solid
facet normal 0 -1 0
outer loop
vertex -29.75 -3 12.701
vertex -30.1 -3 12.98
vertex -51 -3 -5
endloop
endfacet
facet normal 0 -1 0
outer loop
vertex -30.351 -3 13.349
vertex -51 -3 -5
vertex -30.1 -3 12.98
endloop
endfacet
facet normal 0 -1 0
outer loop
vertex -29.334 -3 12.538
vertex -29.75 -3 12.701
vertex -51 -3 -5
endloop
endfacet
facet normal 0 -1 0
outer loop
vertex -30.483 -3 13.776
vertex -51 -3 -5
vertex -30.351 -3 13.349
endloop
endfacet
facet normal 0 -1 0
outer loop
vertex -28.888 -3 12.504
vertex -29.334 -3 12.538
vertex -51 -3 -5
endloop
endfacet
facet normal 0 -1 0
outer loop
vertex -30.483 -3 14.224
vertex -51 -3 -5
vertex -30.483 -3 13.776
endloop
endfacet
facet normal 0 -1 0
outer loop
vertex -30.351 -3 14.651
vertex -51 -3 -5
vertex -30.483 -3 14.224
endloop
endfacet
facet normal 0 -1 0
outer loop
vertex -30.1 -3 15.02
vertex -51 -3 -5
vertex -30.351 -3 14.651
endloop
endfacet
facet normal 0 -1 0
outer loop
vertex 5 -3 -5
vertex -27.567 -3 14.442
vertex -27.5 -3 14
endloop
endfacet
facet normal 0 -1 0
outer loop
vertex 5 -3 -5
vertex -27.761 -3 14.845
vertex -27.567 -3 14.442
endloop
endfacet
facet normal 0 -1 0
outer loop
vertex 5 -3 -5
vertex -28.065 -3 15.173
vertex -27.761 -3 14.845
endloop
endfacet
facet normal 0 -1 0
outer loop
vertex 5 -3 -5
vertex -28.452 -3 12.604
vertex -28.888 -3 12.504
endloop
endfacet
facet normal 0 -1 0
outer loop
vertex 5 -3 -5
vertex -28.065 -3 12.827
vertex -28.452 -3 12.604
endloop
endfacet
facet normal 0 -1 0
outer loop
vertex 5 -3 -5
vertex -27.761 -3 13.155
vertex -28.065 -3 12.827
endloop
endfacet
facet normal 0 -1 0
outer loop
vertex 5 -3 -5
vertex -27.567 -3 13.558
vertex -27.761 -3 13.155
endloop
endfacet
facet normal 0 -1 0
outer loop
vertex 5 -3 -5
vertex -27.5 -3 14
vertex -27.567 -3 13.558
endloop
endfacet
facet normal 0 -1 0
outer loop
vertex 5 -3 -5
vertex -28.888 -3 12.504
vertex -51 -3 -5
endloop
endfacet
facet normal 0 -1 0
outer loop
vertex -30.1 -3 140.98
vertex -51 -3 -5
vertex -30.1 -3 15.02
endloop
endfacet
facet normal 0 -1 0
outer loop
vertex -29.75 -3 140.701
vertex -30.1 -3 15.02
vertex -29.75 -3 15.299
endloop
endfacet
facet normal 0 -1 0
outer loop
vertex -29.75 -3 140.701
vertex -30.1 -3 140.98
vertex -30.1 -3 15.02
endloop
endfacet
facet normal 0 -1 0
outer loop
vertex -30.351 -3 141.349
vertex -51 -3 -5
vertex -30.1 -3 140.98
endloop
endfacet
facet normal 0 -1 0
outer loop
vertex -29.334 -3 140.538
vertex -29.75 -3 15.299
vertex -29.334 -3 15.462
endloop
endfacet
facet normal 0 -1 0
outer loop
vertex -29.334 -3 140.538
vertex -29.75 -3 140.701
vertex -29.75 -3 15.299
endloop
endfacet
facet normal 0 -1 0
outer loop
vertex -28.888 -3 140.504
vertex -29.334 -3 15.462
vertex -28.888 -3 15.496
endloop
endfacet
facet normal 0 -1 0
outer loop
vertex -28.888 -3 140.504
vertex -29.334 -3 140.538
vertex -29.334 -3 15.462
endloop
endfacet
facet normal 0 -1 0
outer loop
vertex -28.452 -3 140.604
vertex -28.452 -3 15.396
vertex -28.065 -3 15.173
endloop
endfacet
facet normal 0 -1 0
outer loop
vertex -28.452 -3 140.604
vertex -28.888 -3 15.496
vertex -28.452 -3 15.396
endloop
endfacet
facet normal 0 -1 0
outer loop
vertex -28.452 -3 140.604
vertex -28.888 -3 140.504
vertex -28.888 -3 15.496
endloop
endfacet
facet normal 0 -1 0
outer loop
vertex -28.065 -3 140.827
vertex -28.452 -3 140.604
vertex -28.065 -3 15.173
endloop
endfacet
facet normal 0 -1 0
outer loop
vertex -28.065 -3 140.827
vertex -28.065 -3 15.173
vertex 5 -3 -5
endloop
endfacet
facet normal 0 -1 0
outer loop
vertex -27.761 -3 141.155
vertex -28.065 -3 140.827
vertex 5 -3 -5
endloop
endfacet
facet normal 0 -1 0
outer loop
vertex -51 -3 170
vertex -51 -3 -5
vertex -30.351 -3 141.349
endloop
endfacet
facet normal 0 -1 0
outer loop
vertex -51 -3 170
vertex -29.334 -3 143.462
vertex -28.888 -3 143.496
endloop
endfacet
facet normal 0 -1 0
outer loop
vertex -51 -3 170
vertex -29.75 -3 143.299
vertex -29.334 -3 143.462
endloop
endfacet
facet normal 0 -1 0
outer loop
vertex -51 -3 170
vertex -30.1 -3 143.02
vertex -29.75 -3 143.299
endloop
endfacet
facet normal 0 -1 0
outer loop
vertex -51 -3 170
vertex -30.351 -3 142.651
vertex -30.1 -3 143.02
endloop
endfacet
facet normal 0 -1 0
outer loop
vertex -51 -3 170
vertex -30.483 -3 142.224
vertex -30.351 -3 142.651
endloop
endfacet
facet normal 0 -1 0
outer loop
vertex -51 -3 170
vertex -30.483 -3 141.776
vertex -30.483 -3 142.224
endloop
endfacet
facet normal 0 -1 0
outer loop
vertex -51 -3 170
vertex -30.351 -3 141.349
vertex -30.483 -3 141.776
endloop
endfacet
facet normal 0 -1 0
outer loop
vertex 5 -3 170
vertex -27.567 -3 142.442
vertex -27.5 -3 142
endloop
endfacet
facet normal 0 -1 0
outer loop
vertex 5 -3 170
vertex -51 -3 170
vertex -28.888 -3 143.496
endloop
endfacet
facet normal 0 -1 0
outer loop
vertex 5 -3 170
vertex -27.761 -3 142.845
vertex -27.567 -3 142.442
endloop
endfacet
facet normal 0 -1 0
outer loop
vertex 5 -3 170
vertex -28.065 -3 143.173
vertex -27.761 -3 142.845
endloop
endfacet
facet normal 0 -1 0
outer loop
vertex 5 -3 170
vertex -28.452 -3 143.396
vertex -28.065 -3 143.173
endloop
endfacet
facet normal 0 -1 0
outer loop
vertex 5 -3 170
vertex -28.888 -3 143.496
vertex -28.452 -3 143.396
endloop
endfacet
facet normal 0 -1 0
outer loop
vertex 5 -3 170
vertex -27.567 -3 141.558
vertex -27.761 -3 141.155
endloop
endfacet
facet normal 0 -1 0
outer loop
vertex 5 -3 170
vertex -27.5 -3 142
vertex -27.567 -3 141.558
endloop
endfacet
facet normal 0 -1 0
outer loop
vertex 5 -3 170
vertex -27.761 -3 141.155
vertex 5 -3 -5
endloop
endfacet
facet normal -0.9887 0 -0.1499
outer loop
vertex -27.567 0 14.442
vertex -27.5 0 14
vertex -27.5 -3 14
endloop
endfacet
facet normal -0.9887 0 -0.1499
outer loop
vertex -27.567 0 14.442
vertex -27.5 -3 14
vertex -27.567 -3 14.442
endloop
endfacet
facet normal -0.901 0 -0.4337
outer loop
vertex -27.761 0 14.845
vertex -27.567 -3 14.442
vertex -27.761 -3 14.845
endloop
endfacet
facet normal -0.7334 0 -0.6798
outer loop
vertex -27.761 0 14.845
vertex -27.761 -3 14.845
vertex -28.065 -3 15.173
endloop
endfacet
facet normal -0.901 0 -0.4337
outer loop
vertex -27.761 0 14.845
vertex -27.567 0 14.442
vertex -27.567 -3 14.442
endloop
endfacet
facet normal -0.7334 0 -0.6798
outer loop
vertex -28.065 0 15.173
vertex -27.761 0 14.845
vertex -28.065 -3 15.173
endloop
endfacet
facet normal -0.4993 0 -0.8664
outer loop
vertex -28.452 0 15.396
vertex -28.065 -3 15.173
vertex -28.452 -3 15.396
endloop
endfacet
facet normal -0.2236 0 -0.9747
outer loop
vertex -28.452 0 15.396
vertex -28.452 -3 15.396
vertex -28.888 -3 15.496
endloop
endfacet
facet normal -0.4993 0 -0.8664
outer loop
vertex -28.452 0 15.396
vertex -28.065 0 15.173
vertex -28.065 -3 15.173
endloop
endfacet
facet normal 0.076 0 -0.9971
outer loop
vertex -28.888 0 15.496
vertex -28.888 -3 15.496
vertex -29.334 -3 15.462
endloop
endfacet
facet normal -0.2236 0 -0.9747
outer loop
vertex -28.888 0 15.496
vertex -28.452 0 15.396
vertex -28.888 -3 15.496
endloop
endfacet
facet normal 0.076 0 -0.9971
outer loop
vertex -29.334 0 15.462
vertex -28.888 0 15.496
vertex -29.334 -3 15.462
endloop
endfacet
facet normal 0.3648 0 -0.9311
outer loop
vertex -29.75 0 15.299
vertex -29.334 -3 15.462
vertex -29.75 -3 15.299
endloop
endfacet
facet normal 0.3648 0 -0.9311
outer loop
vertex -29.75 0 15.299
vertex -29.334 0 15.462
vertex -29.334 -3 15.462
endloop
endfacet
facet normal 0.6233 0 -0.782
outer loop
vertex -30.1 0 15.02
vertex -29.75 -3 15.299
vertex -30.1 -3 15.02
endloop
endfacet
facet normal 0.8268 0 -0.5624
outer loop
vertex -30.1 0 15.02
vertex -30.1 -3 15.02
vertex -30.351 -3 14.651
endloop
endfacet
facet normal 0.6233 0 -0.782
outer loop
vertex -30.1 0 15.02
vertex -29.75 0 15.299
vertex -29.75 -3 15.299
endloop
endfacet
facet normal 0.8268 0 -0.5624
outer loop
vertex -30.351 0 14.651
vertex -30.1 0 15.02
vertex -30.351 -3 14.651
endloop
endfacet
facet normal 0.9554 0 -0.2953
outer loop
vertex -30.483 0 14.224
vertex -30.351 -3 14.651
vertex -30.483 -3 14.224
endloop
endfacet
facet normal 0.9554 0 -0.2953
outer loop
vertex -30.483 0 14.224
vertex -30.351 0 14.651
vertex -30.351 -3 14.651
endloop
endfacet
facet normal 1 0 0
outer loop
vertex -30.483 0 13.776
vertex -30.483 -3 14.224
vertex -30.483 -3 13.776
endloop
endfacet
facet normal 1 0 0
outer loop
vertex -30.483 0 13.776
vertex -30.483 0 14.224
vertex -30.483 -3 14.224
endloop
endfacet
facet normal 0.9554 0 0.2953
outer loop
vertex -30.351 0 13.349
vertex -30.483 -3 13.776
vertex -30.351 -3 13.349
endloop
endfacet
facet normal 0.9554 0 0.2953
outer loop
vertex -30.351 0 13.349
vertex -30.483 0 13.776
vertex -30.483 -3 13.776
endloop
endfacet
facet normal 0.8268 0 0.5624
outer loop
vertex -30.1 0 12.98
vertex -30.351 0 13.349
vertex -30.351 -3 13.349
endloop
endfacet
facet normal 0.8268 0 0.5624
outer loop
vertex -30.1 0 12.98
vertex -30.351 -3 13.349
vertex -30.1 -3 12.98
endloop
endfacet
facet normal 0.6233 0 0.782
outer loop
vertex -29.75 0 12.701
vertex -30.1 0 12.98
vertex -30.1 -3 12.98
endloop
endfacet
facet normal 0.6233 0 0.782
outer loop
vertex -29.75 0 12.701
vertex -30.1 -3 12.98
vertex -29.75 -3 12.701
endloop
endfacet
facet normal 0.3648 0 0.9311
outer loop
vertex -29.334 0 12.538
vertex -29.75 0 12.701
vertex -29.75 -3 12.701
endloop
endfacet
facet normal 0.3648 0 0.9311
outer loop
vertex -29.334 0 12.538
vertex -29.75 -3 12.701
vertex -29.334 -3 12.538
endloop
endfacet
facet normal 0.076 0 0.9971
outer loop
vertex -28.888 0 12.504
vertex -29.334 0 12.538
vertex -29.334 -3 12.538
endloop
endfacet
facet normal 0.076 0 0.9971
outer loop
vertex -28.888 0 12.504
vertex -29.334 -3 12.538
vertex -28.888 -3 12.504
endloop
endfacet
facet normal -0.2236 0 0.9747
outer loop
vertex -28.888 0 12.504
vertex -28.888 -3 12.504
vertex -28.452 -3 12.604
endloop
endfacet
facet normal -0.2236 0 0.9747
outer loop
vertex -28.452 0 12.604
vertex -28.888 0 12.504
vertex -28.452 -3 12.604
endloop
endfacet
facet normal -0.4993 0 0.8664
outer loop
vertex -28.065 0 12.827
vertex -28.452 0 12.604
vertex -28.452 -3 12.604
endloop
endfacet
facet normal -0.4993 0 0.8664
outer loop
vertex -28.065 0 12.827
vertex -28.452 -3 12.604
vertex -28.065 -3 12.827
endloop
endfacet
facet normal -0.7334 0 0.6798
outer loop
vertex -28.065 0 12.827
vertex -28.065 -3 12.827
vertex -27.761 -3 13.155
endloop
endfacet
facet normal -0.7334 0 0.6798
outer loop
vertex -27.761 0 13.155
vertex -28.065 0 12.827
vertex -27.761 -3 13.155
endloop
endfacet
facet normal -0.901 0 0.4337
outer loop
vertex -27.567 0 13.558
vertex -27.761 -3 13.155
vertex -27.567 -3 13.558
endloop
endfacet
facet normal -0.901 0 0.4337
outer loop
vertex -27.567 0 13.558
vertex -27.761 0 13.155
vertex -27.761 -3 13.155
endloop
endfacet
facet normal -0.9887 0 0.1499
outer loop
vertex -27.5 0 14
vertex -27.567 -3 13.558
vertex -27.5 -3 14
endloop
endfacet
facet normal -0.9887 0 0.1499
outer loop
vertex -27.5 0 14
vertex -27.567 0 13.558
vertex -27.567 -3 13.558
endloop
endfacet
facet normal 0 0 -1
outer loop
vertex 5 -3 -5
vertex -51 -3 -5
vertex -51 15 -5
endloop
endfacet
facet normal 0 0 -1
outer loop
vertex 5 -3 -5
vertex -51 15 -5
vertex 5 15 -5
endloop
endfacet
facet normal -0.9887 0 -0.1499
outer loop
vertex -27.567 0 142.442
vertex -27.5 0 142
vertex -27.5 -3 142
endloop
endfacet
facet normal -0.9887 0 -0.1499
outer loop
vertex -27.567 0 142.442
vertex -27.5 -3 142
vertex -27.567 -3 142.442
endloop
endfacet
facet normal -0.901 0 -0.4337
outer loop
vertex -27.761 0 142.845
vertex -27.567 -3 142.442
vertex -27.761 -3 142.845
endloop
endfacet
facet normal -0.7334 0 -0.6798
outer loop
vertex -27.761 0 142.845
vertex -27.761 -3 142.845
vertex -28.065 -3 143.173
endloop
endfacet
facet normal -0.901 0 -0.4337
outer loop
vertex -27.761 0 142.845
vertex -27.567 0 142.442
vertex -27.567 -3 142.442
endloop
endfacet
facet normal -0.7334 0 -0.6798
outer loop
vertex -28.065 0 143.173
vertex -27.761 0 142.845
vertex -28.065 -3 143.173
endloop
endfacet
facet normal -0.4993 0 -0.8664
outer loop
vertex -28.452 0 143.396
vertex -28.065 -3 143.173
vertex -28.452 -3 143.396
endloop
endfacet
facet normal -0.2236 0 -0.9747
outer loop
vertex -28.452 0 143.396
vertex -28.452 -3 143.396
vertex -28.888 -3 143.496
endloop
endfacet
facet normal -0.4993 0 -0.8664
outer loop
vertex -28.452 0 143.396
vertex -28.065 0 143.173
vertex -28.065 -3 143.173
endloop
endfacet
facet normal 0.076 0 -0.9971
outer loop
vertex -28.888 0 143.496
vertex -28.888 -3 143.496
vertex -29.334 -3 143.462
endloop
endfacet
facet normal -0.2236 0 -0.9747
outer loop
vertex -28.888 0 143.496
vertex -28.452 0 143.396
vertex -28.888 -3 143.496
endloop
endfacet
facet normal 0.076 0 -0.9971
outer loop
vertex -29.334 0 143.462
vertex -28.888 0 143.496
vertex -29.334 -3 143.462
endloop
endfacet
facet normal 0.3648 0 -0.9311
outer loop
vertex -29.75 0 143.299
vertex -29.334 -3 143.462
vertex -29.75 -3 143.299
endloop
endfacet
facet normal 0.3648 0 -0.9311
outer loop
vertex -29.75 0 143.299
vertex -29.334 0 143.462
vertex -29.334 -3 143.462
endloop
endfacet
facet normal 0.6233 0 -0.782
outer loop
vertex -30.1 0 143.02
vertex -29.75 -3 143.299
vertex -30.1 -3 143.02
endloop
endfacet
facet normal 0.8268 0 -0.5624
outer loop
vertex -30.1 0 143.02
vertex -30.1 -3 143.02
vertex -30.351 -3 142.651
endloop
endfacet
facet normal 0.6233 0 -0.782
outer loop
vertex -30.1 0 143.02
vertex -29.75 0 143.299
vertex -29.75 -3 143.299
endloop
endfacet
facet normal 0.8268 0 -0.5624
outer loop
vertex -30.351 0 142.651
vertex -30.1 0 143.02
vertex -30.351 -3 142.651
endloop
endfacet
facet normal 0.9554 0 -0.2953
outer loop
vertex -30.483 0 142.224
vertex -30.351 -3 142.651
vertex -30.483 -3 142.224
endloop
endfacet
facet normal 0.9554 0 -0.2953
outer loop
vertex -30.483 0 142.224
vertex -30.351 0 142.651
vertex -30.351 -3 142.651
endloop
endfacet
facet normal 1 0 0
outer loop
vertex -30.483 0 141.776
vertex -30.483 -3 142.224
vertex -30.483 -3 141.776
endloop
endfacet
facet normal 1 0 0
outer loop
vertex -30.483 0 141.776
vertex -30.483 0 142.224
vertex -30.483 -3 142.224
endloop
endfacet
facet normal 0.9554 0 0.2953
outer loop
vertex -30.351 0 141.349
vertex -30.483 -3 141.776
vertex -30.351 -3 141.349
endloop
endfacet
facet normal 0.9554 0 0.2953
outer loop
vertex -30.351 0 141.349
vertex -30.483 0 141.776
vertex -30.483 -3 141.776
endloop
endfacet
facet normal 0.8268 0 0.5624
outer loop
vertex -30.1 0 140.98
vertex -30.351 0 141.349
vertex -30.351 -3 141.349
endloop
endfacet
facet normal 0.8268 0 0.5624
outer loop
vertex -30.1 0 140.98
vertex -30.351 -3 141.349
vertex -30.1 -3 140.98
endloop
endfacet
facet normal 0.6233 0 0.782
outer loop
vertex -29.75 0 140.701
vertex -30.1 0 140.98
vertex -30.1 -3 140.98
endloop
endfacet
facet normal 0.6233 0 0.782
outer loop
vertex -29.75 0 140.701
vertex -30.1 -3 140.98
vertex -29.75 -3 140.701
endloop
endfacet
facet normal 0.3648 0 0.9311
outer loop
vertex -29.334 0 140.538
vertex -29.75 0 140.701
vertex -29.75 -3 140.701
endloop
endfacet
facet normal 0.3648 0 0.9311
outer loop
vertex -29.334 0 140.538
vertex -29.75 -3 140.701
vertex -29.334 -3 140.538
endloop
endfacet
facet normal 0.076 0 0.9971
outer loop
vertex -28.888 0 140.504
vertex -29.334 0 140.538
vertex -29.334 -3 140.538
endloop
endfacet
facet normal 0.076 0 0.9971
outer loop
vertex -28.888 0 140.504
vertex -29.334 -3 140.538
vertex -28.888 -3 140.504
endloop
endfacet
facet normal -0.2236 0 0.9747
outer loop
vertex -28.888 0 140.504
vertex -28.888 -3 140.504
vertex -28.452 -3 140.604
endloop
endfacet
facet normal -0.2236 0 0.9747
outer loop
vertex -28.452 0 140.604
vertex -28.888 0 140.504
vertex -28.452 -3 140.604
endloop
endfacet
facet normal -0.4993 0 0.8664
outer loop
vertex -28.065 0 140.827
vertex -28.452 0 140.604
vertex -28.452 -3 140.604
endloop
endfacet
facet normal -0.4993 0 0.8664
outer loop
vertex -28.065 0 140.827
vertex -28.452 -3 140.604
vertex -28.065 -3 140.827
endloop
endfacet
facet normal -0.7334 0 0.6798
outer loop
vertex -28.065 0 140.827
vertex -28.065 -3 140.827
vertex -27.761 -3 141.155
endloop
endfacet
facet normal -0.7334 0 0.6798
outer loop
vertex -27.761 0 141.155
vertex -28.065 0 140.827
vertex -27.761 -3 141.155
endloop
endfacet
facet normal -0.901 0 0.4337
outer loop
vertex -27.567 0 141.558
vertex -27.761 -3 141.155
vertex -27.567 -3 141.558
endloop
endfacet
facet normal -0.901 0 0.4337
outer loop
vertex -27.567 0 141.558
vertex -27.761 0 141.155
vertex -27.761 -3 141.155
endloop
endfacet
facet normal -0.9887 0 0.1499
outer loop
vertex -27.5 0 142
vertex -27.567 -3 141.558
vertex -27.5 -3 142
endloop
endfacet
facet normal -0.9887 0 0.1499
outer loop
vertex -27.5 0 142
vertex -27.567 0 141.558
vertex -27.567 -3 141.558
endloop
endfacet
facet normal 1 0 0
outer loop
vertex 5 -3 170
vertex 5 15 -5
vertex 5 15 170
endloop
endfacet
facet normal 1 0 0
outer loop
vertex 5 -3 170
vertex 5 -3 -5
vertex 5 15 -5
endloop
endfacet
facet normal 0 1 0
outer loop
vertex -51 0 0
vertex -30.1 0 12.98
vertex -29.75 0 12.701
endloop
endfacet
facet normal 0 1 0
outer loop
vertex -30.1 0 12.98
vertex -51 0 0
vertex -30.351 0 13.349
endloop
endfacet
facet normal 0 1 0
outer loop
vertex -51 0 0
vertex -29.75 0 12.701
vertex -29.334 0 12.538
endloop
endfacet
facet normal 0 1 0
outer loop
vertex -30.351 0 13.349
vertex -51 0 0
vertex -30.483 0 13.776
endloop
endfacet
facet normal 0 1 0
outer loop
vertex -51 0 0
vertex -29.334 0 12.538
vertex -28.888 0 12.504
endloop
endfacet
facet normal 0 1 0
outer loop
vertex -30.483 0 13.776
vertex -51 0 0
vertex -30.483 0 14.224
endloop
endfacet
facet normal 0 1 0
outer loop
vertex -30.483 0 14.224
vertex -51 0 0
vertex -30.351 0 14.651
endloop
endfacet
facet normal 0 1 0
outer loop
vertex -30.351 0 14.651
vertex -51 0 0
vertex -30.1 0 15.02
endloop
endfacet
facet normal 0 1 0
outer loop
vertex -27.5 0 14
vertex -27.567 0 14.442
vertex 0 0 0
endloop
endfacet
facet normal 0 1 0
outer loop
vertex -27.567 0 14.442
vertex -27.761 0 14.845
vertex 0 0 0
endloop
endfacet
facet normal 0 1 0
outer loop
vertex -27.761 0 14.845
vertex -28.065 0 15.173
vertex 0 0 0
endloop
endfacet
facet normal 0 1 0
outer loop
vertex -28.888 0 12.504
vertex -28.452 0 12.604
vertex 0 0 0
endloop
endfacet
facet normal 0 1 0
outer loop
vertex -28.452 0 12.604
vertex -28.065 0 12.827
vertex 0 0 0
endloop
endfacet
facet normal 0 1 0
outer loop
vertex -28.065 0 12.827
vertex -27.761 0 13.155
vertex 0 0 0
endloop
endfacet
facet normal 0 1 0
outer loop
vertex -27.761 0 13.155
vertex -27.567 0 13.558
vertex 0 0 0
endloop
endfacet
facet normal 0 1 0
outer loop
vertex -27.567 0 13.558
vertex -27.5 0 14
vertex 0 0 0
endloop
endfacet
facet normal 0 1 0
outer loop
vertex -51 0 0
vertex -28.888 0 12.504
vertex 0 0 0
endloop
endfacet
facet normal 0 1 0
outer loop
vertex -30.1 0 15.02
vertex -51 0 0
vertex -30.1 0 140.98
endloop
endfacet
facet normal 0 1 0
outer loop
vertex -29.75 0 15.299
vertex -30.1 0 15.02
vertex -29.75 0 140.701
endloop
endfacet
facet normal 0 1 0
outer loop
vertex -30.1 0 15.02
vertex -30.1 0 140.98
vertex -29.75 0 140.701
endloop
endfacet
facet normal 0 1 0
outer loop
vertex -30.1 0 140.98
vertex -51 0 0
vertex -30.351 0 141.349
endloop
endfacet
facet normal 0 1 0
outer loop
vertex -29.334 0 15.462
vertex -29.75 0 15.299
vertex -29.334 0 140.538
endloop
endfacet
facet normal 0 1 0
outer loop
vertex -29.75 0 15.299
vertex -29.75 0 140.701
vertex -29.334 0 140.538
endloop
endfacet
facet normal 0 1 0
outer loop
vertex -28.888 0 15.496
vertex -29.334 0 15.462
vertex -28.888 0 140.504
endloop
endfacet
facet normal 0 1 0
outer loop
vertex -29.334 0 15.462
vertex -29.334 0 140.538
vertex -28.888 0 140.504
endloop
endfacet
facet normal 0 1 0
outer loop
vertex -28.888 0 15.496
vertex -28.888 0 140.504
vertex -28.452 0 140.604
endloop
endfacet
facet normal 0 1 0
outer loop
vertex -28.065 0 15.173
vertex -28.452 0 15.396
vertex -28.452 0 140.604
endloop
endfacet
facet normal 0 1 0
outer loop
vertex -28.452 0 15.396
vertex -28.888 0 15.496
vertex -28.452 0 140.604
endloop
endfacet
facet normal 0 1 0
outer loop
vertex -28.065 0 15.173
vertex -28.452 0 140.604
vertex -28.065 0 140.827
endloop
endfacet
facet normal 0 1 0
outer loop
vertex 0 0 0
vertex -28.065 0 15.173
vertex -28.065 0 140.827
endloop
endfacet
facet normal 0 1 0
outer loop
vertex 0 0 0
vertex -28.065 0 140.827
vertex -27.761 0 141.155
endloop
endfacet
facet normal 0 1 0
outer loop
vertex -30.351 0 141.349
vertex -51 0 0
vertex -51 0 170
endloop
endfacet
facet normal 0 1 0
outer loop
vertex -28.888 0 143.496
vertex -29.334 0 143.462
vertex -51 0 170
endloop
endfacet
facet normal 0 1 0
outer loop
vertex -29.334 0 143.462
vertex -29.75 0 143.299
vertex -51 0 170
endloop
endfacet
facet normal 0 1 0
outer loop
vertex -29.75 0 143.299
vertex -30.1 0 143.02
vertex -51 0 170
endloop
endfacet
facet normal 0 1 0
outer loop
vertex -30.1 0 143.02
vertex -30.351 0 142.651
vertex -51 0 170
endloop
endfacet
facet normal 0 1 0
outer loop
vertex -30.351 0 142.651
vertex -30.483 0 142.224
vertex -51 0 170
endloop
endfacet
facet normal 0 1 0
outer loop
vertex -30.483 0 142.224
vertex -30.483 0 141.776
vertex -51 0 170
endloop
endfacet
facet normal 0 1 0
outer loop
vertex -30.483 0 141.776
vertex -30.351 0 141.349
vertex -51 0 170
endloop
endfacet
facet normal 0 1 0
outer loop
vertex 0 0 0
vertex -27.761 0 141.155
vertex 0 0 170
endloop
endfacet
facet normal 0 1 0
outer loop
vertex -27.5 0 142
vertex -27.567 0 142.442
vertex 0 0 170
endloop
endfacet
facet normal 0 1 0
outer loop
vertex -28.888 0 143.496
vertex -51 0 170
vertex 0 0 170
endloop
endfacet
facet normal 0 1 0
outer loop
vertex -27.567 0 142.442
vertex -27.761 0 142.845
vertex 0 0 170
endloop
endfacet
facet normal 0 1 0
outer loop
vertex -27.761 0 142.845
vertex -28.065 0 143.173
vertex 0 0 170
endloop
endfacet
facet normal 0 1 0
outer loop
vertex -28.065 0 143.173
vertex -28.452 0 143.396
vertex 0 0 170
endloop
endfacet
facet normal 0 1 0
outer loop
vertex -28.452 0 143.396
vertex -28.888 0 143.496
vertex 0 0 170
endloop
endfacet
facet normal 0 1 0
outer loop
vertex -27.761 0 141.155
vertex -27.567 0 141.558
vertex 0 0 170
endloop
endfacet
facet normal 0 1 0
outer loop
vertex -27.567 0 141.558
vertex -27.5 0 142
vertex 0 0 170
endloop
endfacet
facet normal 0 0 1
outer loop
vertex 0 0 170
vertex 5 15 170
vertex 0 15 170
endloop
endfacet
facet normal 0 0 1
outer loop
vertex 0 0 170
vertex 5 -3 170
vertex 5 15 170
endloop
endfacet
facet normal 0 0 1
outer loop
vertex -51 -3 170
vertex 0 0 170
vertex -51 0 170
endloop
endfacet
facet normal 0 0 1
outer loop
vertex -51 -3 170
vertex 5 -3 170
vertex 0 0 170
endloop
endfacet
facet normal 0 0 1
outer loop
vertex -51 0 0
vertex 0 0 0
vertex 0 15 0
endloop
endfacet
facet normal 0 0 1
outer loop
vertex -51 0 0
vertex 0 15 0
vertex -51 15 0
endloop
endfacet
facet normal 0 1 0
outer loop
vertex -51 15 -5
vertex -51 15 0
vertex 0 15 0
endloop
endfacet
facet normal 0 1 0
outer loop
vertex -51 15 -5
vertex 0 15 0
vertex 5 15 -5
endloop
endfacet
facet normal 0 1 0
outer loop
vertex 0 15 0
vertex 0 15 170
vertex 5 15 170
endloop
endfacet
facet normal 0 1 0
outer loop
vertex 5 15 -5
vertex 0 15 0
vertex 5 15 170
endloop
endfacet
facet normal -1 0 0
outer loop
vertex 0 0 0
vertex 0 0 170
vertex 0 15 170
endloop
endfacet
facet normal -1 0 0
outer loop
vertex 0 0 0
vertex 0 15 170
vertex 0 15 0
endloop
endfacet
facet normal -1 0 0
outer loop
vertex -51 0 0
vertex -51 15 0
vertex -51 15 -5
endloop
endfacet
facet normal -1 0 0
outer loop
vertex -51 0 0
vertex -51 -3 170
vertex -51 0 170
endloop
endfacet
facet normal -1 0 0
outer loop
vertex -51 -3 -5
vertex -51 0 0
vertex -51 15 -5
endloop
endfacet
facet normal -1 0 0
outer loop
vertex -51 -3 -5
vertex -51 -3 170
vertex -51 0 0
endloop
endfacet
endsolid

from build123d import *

# Parameters (mm, degrees)
F0_W     = 51
F0_H     = 170
F0_R     = 1.5
F1_DEPTH = 3
F2_DEPTH = 3
F3_DEPTH = 15


with BuildPart() as f1:
    # F0 (on Front) → F1 (new body)
    with BuildSketch(Plane.XZ):
        with Locations((-25.5, 85)):
            Rectangle(F0_W, F0_H)
        with Locations((-29, 14)):
            Circle(F0_R, mode=Mode.SUBTRACT)
        with Locations((-29, 142)):
            Circle(F0_R, mode=Mode.SUBTRACT)
    extrude(amount=F1_DEPTH)

    # F0 (on Front) → F2 (join)
    with BuildSketch(Plane.XZ):
        Polygon((0, 170), (0, 0), (-51, 0), (-51, -5), (0, -5), (5, -5), (5, 170), align=None)
    extrude(amount=F2_DEPTH)

    # F0 (on Front) → F3 (join)
    with BuildSketch(Plane.XZ):
        Polygon((0, 170), (0, 0), (-51, 0), (-51, -5), (0, -5), (5, -5), (5, 170), align=None)
    extrude(amount=-F3_DEPTH)


solid = f1.part
